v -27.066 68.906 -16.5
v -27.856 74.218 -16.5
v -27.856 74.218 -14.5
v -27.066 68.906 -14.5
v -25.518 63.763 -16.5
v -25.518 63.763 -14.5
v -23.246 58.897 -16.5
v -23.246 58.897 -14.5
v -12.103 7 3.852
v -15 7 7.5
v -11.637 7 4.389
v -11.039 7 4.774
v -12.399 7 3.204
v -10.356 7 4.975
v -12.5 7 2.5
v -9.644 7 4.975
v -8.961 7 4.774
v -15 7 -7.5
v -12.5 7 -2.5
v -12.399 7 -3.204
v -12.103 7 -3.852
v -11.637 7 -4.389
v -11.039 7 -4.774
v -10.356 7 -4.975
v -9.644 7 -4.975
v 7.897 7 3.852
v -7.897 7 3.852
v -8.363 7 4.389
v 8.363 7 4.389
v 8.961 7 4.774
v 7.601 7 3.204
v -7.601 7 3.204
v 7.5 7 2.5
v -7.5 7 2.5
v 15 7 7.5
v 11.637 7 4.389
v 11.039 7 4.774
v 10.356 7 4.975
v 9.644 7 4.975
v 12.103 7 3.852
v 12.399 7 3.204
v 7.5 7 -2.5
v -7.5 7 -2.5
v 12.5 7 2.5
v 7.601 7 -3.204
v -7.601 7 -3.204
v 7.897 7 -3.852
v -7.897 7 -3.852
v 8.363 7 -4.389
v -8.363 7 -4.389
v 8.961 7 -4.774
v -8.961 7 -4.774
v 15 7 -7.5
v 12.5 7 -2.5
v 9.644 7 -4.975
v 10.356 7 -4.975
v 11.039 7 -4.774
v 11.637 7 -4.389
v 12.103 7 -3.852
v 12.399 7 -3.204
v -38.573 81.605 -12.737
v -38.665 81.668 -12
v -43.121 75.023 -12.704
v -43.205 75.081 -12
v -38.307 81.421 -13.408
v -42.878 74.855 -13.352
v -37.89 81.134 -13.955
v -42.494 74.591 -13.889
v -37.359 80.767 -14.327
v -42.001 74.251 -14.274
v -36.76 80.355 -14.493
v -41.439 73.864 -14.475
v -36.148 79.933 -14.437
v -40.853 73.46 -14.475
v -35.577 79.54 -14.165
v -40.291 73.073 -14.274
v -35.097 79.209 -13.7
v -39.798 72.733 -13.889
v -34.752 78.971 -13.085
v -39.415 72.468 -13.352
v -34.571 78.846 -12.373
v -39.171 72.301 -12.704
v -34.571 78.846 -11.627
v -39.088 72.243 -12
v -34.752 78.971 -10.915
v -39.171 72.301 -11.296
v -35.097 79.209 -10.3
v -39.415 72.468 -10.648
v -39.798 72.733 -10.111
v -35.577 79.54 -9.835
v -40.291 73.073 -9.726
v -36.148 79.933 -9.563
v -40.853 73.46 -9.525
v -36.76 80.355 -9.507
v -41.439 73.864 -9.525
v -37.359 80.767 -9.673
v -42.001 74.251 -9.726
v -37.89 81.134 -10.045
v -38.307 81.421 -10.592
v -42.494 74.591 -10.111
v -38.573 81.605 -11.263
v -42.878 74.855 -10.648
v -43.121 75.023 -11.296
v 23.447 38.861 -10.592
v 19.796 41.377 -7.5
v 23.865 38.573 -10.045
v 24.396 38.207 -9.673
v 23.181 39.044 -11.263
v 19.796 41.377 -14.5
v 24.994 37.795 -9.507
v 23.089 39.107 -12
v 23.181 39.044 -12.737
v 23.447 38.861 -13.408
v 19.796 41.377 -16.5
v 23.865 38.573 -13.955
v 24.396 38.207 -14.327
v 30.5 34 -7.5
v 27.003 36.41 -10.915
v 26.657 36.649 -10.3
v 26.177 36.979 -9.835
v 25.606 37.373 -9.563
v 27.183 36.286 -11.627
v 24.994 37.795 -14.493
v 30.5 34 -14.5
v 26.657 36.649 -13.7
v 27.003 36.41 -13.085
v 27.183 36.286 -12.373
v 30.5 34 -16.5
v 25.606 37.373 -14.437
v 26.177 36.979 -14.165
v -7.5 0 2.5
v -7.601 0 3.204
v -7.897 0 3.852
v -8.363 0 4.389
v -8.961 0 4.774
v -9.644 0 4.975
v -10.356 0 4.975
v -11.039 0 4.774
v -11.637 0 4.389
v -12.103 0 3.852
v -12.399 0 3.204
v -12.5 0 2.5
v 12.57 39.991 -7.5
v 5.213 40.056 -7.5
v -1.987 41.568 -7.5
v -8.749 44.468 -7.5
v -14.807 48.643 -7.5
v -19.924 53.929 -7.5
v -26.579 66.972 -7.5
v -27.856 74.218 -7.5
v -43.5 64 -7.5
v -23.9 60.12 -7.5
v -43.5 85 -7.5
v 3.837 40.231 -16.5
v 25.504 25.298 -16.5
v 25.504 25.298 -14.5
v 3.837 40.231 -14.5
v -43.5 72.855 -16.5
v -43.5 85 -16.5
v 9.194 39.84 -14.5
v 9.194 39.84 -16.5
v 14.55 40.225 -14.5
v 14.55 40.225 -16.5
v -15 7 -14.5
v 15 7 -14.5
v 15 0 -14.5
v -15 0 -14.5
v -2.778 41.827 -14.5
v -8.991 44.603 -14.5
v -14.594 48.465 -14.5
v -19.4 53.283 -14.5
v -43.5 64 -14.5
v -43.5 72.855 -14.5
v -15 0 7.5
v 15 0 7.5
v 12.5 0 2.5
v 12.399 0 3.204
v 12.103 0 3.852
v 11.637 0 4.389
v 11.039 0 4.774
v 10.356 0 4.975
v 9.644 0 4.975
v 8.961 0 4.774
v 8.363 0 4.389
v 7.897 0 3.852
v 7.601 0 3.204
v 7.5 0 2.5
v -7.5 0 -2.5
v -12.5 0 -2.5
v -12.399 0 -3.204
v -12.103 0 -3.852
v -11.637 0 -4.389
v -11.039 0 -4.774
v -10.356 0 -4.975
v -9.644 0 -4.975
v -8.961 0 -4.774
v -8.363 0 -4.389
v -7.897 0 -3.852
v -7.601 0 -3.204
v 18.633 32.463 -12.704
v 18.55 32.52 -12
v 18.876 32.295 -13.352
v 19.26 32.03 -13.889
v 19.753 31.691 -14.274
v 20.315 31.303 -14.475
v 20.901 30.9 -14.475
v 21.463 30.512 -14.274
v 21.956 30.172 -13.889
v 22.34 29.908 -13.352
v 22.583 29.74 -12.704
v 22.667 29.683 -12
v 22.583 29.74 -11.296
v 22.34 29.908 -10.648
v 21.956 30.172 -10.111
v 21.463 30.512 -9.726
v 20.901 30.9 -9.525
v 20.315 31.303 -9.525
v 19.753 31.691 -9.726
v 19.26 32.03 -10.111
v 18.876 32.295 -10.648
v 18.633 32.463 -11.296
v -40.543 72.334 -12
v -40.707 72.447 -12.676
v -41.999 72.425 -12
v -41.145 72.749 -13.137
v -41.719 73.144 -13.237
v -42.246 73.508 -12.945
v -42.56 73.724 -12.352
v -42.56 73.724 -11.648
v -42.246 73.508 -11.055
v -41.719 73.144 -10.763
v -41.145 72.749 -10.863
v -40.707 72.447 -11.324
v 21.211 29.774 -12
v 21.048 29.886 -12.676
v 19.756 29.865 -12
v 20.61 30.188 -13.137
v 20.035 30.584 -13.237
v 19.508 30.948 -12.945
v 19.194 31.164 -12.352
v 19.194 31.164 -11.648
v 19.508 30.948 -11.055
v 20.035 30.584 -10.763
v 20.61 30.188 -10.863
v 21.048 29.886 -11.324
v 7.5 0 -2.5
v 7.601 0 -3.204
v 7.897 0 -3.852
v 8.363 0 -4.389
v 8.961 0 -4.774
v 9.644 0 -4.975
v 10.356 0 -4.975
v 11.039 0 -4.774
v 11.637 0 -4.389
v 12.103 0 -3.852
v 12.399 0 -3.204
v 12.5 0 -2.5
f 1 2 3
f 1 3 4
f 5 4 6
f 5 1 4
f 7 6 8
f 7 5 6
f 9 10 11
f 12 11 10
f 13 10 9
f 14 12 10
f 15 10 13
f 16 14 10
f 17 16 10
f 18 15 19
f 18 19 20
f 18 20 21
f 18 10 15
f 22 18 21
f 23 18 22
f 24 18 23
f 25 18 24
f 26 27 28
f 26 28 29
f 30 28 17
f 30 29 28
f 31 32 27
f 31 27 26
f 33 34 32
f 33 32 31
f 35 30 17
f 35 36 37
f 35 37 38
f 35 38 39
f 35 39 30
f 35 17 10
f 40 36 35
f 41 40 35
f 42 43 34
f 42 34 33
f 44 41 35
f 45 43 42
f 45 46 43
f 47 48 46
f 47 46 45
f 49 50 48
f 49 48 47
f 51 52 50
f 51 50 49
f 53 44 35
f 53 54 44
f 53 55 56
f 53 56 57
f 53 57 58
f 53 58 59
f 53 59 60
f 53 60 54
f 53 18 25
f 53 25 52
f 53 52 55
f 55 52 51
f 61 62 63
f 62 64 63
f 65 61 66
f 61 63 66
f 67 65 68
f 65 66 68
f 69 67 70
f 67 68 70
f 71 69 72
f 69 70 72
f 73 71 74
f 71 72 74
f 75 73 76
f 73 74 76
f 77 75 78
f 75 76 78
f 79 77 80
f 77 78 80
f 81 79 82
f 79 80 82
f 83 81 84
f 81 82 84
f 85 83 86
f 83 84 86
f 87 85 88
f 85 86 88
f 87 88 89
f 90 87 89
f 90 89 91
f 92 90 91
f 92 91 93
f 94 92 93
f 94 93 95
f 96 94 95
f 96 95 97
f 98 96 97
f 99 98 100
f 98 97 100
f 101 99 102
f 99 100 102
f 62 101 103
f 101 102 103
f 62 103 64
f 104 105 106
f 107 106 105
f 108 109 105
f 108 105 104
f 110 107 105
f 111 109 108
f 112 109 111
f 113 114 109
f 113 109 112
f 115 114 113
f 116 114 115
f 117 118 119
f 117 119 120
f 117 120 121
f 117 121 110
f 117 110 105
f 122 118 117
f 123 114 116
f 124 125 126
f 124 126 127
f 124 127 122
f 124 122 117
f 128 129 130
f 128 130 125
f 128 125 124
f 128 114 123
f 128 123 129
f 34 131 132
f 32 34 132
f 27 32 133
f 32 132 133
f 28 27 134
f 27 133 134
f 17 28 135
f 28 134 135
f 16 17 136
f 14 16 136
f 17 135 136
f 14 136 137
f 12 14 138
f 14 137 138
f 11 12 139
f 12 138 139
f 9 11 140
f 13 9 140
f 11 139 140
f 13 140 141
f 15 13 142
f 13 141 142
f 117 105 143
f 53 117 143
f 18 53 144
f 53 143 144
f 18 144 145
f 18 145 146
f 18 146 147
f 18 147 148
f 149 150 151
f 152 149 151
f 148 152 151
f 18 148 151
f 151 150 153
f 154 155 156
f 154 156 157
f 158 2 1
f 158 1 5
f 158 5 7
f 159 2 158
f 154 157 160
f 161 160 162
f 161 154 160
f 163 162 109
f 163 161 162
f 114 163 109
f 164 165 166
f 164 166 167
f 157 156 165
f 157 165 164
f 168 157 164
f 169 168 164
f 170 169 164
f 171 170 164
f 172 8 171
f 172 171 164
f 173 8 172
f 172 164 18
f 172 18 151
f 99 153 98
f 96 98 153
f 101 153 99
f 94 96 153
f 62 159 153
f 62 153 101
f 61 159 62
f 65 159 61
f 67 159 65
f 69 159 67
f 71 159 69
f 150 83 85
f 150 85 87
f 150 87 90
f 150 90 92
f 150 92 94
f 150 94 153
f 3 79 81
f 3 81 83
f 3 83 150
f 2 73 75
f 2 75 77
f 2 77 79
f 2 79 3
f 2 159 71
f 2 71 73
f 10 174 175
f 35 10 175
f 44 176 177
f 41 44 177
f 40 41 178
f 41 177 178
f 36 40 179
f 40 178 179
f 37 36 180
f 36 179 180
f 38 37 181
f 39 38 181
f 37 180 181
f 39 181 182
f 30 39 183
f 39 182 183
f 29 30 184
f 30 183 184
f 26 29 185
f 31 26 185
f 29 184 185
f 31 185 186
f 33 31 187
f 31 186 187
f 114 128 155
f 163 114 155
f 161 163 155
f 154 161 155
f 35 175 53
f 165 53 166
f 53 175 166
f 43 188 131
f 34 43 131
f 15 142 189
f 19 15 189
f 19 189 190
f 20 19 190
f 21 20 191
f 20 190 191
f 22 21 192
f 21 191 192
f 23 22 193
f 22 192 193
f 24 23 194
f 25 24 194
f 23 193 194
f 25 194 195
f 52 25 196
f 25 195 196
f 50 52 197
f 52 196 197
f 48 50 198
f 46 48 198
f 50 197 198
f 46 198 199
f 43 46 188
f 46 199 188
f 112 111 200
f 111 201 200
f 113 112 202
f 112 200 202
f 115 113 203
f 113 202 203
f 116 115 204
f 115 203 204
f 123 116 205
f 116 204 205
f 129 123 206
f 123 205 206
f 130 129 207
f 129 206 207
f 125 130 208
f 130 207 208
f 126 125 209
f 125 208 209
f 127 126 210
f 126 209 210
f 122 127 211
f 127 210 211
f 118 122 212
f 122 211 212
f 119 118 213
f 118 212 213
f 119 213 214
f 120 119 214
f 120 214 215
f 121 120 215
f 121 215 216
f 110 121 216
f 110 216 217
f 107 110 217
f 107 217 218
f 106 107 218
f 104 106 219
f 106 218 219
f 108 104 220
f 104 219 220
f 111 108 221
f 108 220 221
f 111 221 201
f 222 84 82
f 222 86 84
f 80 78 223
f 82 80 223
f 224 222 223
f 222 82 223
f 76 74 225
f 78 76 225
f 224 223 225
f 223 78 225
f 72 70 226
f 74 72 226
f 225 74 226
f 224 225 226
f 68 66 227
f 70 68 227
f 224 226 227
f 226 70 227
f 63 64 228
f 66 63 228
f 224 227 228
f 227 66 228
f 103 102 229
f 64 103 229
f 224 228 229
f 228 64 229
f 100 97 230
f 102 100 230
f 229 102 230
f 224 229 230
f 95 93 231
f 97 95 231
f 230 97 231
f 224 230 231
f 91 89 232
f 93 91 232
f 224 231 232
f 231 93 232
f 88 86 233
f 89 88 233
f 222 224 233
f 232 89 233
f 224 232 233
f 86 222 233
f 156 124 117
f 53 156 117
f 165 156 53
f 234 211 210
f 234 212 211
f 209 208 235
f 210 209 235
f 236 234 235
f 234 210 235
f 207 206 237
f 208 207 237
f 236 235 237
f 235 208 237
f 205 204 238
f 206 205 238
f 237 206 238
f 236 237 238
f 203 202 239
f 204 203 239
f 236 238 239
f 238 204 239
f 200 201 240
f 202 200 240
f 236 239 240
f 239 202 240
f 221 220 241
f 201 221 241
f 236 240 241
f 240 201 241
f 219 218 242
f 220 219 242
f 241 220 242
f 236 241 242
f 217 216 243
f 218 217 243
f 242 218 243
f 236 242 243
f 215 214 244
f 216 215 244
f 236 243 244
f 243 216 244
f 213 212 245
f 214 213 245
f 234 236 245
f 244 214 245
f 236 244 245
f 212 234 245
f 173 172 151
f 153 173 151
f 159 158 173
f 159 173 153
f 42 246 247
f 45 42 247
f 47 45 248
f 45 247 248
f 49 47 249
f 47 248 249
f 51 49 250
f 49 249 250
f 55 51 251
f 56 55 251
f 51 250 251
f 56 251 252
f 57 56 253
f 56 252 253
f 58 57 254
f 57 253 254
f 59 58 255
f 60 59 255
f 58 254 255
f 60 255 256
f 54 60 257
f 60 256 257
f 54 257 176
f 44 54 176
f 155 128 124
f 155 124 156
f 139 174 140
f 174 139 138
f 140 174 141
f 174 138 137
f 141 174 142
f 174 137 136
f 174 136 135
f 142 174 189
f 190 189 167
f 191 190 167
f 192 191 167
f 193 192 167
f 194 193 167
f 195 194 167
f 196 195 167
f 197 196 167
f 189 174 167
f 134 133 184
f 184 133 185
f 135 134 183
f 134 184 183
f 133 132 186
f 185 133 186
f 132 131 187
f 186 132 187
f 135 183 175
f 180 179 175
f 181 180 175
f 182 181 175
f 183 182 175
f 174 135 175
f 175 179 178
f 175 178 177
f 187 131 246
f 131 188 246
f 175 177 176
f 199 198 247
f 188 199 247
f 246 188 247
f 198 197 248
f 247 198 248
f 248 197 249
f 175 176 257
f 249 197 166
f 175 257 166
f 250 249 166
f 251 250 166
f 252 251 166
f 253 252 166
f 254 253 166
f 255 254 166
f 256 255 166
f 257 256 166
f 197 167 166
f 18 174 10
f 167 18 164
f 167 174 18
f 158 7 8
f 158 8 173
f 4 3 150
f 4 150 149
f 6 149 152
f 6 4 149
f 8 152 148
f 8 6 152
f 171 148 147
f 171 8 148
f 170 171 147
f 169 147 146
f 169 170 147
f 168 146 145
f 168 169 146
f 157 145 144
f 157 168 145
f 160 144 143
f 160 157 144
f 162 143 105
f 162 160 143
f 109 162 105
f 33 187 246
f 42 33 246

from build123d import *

# Parameters (mm, degrees)
SKETCH1_W                       = 30
SKETCH1_H                       = 22
BOSS_EXTRUDE1_DEPTH             = 7
BOSS_EXTRUDE2_DEPTH             = 7
BOSS_EXTRUDE3_START             = 2
BOSS_EXTRUDE3_DEPTH             = 2
TAP_DRILL_FOR_M6X1_0_TAP2_D     = 5
TAP_DRILL_FOR_M6X1_0_TAP2_DEPTH = 8
TAP_DRILL_FOR_M6X1_0_TAP2_TIP   = 1.502151548


with BuildPart() as part:
    # Sketch1 → Boss-Extrude1 (new body)
    with BuildSketch(Plane(origin=(0, 0, 0), x_dir=(1, 0, 0), z_dir=(0, 1, 0))):
        with Locations((0, 3.5)):
            Rectangle(SKETCH1_W, SKETCH1_H)
        with BuildLine():
            ThreePointArc((-7.5, -2.5), (-10, -5), (-12.5, -2.5))
            Line((-12.5, -2.5), (-12.5, 2.5))
            ThreePointArc((-12.5, 2.5), (-10, 5), (-7.5, 2.5))
            Line((-7.5, 2.5), (-7.5, -2.5))
        make_face(mode=Mode.SUBTRACT)
        with BuildLine():
            ThreePointArc((12.5, -2.5), (10, -5), (7.5, -2.5))
            Line((7.5, -2.5), (7.5, 2.5))
            ThreePointArc((7.5, 2.5), (10, 5), (12.5, 2.5))
            Line((12.5, 2.5), (12.5, -2.5))
        make_face(mode=Mode.SUBTRACT)
    extrude(amount=BOSS_EXTRUDE1_DEPTH)

    # Sketch2 → Boss-Extrude2 (add)
    with BuildSketch(Plane(origin=(0, 0, -14.5), x_dir=(-1, 0, 0), z_dir=(0, 0, -1))):
        with BuildLine():
            Line((-15, 7), (15, 7))
            Line((15, 7), (43.5, 64))
            Line((43.5, 64), (43.5, 85))
            Line((43.5, 85), (27.855550733, 74.218014694))
            ThreePointArc((27.855550733, 74.218014694), (11.88121166, 46.405371431), (-19.795903133, 41.377147841))
            Line((-19.795903133, 41.377147841), (-30.5, 34))
            Line((-30.5, 34), (-15, 7))
        make_face()
    extrude(amount=-BOSS_EXTRUDE2_DEPTH)

    # Sketch3 → Boss-Extrude3 (add)
    with BuildSketch(Plane(origin=(0, 0, -14.5), x_dir=(-1, 0, 0), z_dir=(0, 0, -1)).offset(BOSS_EXTRUDE3_START)):
        with BuildLine():
            Line((-19.795903133, 41.377147841), (-30.5, 34))
            Line((-30.5, 34), (-25.504418015, 25.298018478))
            Line((-25.504418015, 25.298018478), (-3.837244639, 40.230800129))
            ThreePointArc((-3.837244639, 40.230800129), (-11.878974739, 39.935272554), (-19.795903133, 41.377147841))
        make_face()
        with BuildLine():
            Line((43.5, 85), (27.855550733, 74.218014694))
            ThreePointArc((27.855550733, 74.218014694), (26.38496828, 66.306368419), (23.246350456, 58.896521073))
            Line((23.246350456, 58.896521073), (43.5, 72.85511738))
            Line((43.5, 72.85511738), (43.5, 85))
        make_face()
    extrude(amount=-BOSS_EXTRUDE3_DEPTH)

    # Tap Drill for M6x1.0 Tap2
    with Locations(Plane(origin=(25.708369444, 37.302339978, 0), x_dir=(0.8233920666857286, -0.5674729108239484, 0), z_dir=(0.5674729108239484, 0.8233920666857286, 0))):
        with Locations((-75.680620934, 12), (-0.680620934, 12)):
            Hole(TAP_DRILL_FOR_M6X1_0_TAP2_D / 2, depth=TAP_DRILL_FOR_M6X1_0_TAP2_DEPTH)
            with Locations((0, 0, -(TAP_DRILL_FOR_M6X1_0_TAP2_DEPTH + TAP_DRILL_FOR_M6X1_0_TAP2_TIP / 2))):  # 118° drill point
                Cone(0, TAP_DRILL_FOR_M6X1_0_TAP2_D / 2, TAP_DRILL_FOR_M6X1_0_TAP2_TIP, mode=Mode.SUBTRACT)


solid = part.part
